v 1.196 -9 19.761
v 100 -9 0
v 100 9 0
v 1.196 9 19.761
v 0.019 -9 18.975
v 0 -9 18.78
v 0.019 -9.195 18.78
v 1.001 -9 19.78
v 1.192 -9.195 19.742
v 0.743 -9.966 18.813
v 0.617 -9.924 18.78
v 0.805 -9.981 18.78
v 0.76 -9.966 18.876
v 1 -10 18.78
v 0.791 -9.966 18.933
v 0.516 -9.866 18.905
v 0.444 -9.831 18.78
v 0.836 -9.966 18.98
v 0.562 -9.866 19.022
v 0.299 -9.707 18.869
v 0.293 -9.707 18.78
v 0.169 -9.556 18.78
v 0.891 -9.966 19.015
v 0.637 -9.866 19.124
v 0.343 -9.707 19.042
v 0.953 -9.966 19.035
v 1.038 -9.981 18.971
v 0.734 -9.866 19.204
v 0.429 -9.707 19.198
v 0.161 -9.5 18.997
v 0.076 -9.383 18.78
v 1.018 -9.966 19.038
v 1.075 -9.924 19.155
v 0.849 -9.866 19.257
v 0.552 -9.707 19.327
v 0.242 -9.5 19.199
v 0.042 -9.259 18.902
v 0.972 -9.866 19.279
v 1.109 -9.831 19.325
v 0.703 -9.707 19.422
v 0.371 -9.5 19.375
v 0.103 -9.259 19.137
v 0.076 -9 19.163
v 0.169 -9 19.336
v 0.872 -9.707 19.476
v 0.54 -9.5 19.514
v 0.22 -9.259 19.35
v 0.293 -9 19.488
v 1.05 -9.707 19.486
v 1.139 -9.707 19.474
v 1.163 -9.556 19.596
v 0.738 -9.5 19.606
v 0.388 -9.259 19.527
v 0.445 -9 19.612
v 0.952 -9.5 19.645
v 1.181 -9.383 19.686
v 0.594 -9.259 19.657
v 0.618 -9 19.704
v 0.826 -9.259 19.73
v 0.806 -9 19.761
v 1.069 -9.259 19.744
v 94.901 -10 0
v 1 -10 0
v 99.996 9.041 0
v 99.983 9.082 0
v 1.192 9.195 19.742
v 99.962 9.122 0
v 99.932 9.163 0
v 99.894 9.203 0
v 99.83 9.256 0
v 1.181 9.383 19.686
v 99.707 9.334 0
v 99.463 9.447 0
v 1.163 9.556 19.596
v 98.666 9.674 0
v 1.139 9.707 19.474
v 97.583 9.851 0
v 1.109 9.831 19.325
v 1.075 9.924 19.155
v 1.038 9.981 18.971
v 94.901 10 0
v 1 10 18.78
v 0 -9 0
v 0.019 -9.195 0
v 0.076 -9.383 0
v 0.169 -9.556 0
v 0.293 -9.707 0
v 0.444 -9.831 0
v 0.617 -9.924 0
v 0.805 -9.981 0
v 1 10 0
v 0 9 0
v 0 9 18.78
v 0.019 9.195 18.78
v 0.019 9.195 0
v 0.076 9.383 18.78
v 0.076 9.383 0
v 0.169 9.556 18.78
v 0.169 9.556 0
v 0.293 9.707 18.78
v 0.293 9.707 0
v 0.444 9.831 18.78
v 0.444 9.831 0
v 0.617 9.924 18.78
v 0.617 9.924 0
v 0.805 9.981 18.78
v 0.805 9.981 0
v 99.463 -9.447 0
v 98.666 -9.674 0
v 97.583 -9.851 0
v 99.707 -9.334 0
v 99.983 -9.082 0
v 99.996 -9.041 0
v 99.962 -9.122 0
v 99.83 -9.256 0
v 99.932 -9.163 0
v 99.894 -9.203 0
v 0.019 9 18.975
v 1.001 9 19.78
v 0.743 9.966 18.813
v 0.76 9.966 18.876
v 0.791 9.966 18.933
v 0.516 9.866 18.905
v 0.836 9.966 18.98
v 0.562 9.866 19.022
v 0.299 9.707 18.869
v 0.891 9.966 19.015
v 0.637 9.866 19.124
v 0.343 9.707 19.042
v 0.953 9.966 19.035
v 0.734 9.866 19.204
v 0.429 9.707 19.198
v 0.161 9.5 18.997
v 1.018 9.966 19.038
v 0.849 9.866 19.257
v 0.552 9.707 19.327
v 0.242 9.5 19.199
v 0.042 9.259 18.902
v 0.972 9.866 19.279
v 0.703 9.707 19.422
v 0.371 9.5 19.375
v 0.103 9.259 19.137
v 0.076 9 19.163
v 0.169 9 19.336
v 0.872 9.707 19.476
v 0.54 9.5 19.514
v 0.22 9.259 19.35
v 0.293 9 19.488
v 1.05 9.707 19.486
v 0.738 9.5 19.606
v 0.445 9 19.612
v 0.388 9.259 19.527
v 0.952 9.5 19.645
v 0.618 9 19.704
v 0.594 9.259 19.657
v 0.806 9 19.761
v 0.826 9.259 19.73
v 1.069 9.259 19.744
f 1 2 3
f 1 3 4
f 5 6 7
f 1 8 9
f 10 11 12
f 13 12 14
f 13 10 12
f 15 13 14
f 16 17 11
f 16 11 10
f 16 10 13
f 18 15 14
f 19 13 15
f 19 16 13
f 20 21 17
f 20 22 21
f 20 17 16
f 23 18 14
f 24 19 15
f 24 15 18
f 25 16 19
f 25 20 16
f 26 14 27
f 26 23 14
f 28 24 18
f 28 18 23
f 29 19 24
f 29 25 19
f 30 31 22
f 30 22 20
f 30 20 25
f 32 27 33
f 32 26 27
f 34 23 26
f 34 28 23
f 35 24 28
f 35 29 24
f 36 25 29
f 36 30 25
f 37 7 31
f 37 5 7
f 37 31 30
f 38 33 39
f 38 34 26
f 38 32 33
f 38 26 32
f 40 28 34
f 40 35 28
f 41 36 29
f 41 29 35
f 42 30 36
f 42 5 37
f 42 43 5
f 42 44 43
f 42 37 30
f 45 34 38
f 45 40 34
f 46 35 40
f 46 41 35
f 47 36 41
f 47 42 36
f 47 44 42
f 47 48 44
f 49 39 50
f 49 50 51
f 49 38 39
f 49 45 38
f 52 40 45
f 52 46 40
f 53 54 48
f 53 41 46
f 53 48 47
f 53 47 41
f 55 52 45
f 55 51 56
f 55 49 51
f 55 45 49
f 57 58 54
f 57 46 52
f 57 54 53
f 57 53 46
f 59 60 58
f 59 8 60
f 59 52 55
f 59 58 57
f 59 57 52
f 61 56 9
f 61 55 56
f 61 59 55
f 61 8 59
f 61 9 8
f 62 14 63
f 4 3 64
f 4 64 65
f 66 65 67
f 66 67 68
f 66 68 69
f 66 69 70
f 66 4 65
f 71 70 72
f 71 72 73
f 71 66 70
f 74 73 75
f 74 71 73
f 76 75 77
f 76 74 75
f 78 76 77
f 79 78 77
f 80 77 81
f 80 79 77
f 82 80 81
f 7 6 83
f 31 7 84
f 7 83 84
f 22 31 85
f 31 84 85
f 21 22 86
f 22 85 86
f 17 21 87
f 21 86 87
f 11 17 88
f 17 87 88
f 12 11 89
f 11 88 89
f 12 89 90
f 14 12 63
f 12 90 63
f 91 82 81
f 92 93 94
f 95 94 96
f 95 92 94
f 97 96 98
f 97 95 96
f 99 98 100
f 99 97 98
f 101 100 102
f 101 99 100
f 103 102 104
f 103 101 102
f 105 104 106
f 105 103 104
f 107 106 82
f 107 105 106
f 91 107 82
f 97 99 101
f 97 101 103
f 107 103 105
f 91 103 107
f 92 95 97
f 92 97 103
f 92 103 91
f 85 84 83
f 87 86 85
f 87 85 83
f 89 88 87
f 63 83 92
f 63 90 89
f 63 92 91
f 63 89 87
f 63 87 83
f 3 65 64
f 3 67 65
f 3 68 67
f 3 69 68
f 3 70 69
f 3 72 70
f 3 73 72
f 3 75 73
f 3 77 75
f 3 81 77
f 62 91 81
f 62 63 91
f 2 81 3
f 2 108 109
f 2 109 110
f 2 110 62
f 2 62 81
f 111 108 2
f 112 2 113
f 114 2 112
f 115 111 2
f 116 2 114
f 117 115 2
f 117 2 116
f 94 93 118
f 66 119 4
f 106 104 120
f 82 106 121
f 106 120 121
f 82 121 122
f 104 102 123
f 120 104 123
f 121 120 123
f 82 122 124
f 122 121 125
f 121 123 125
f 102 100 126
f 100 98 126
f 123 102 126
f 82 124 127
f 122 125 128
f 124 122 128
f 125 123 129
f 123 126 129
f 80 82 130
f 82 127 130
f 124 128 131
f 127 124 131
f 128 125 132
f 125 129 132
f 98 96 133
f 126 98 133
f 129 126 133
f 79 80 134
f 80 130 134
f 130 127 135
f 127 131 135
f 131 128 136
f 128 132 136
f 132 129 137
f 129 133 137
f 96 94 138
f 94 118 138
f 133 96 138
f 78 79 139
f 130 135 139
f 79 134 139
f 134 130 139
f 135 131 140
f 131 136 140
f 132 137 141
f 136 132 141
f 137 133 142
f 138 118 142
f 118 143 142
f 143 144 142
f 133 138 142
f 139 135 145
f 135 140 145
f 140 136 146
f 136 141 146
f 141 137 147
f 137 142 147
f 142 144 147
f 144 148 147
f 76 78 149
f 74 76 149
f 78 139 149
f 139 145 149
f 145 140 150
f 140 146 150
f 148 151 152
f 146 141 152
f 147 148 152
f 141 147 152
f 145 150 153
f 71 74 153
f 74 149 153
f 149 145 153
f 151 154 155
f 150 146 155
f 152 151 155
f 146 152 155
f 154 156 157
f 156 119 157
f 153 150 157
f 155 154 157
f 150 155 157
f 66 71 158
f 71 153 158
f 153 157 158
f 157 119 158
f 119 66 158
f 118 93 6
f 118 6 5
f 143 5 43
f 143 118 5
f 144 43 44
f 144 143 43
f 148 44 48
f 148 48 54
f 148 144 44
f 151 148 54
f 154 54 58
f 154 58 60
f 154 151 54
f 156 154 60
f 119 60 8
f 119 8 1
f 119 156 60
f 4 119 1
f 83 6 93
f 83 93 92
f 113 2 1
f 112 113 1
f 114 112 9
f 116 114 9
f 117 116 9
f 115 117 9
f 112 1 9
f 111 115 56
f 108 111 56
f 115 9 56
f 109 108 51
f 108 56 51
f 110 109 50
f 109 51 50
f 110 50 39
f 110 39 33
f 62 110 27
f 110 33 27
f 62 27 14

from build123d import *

# Parameters (mm, degrees)
F1_DEPTH = 10
F2_R     = 1


with BuildPart() as f1:
    # F0 (on Front) → F1 (new body, symmetric)
    with BuildSketch(Plane.XZ):
        Polygon((0, 20), (0, 0), (100, 0), align=None)
    extrude(amount=F1_DEPTH, both=True)

    # F2
    f2_edges = [f1.edges().sort_by_distance(p)[0] for p in [
        (50, -10, 10),
        (50, 10, 10),
        (0, 0, 20),
        (0, -10, 10),
        (0, 10, 10),
    ]]
    fillet(f2_edges, radius=F2_R)


solid = f1.part
